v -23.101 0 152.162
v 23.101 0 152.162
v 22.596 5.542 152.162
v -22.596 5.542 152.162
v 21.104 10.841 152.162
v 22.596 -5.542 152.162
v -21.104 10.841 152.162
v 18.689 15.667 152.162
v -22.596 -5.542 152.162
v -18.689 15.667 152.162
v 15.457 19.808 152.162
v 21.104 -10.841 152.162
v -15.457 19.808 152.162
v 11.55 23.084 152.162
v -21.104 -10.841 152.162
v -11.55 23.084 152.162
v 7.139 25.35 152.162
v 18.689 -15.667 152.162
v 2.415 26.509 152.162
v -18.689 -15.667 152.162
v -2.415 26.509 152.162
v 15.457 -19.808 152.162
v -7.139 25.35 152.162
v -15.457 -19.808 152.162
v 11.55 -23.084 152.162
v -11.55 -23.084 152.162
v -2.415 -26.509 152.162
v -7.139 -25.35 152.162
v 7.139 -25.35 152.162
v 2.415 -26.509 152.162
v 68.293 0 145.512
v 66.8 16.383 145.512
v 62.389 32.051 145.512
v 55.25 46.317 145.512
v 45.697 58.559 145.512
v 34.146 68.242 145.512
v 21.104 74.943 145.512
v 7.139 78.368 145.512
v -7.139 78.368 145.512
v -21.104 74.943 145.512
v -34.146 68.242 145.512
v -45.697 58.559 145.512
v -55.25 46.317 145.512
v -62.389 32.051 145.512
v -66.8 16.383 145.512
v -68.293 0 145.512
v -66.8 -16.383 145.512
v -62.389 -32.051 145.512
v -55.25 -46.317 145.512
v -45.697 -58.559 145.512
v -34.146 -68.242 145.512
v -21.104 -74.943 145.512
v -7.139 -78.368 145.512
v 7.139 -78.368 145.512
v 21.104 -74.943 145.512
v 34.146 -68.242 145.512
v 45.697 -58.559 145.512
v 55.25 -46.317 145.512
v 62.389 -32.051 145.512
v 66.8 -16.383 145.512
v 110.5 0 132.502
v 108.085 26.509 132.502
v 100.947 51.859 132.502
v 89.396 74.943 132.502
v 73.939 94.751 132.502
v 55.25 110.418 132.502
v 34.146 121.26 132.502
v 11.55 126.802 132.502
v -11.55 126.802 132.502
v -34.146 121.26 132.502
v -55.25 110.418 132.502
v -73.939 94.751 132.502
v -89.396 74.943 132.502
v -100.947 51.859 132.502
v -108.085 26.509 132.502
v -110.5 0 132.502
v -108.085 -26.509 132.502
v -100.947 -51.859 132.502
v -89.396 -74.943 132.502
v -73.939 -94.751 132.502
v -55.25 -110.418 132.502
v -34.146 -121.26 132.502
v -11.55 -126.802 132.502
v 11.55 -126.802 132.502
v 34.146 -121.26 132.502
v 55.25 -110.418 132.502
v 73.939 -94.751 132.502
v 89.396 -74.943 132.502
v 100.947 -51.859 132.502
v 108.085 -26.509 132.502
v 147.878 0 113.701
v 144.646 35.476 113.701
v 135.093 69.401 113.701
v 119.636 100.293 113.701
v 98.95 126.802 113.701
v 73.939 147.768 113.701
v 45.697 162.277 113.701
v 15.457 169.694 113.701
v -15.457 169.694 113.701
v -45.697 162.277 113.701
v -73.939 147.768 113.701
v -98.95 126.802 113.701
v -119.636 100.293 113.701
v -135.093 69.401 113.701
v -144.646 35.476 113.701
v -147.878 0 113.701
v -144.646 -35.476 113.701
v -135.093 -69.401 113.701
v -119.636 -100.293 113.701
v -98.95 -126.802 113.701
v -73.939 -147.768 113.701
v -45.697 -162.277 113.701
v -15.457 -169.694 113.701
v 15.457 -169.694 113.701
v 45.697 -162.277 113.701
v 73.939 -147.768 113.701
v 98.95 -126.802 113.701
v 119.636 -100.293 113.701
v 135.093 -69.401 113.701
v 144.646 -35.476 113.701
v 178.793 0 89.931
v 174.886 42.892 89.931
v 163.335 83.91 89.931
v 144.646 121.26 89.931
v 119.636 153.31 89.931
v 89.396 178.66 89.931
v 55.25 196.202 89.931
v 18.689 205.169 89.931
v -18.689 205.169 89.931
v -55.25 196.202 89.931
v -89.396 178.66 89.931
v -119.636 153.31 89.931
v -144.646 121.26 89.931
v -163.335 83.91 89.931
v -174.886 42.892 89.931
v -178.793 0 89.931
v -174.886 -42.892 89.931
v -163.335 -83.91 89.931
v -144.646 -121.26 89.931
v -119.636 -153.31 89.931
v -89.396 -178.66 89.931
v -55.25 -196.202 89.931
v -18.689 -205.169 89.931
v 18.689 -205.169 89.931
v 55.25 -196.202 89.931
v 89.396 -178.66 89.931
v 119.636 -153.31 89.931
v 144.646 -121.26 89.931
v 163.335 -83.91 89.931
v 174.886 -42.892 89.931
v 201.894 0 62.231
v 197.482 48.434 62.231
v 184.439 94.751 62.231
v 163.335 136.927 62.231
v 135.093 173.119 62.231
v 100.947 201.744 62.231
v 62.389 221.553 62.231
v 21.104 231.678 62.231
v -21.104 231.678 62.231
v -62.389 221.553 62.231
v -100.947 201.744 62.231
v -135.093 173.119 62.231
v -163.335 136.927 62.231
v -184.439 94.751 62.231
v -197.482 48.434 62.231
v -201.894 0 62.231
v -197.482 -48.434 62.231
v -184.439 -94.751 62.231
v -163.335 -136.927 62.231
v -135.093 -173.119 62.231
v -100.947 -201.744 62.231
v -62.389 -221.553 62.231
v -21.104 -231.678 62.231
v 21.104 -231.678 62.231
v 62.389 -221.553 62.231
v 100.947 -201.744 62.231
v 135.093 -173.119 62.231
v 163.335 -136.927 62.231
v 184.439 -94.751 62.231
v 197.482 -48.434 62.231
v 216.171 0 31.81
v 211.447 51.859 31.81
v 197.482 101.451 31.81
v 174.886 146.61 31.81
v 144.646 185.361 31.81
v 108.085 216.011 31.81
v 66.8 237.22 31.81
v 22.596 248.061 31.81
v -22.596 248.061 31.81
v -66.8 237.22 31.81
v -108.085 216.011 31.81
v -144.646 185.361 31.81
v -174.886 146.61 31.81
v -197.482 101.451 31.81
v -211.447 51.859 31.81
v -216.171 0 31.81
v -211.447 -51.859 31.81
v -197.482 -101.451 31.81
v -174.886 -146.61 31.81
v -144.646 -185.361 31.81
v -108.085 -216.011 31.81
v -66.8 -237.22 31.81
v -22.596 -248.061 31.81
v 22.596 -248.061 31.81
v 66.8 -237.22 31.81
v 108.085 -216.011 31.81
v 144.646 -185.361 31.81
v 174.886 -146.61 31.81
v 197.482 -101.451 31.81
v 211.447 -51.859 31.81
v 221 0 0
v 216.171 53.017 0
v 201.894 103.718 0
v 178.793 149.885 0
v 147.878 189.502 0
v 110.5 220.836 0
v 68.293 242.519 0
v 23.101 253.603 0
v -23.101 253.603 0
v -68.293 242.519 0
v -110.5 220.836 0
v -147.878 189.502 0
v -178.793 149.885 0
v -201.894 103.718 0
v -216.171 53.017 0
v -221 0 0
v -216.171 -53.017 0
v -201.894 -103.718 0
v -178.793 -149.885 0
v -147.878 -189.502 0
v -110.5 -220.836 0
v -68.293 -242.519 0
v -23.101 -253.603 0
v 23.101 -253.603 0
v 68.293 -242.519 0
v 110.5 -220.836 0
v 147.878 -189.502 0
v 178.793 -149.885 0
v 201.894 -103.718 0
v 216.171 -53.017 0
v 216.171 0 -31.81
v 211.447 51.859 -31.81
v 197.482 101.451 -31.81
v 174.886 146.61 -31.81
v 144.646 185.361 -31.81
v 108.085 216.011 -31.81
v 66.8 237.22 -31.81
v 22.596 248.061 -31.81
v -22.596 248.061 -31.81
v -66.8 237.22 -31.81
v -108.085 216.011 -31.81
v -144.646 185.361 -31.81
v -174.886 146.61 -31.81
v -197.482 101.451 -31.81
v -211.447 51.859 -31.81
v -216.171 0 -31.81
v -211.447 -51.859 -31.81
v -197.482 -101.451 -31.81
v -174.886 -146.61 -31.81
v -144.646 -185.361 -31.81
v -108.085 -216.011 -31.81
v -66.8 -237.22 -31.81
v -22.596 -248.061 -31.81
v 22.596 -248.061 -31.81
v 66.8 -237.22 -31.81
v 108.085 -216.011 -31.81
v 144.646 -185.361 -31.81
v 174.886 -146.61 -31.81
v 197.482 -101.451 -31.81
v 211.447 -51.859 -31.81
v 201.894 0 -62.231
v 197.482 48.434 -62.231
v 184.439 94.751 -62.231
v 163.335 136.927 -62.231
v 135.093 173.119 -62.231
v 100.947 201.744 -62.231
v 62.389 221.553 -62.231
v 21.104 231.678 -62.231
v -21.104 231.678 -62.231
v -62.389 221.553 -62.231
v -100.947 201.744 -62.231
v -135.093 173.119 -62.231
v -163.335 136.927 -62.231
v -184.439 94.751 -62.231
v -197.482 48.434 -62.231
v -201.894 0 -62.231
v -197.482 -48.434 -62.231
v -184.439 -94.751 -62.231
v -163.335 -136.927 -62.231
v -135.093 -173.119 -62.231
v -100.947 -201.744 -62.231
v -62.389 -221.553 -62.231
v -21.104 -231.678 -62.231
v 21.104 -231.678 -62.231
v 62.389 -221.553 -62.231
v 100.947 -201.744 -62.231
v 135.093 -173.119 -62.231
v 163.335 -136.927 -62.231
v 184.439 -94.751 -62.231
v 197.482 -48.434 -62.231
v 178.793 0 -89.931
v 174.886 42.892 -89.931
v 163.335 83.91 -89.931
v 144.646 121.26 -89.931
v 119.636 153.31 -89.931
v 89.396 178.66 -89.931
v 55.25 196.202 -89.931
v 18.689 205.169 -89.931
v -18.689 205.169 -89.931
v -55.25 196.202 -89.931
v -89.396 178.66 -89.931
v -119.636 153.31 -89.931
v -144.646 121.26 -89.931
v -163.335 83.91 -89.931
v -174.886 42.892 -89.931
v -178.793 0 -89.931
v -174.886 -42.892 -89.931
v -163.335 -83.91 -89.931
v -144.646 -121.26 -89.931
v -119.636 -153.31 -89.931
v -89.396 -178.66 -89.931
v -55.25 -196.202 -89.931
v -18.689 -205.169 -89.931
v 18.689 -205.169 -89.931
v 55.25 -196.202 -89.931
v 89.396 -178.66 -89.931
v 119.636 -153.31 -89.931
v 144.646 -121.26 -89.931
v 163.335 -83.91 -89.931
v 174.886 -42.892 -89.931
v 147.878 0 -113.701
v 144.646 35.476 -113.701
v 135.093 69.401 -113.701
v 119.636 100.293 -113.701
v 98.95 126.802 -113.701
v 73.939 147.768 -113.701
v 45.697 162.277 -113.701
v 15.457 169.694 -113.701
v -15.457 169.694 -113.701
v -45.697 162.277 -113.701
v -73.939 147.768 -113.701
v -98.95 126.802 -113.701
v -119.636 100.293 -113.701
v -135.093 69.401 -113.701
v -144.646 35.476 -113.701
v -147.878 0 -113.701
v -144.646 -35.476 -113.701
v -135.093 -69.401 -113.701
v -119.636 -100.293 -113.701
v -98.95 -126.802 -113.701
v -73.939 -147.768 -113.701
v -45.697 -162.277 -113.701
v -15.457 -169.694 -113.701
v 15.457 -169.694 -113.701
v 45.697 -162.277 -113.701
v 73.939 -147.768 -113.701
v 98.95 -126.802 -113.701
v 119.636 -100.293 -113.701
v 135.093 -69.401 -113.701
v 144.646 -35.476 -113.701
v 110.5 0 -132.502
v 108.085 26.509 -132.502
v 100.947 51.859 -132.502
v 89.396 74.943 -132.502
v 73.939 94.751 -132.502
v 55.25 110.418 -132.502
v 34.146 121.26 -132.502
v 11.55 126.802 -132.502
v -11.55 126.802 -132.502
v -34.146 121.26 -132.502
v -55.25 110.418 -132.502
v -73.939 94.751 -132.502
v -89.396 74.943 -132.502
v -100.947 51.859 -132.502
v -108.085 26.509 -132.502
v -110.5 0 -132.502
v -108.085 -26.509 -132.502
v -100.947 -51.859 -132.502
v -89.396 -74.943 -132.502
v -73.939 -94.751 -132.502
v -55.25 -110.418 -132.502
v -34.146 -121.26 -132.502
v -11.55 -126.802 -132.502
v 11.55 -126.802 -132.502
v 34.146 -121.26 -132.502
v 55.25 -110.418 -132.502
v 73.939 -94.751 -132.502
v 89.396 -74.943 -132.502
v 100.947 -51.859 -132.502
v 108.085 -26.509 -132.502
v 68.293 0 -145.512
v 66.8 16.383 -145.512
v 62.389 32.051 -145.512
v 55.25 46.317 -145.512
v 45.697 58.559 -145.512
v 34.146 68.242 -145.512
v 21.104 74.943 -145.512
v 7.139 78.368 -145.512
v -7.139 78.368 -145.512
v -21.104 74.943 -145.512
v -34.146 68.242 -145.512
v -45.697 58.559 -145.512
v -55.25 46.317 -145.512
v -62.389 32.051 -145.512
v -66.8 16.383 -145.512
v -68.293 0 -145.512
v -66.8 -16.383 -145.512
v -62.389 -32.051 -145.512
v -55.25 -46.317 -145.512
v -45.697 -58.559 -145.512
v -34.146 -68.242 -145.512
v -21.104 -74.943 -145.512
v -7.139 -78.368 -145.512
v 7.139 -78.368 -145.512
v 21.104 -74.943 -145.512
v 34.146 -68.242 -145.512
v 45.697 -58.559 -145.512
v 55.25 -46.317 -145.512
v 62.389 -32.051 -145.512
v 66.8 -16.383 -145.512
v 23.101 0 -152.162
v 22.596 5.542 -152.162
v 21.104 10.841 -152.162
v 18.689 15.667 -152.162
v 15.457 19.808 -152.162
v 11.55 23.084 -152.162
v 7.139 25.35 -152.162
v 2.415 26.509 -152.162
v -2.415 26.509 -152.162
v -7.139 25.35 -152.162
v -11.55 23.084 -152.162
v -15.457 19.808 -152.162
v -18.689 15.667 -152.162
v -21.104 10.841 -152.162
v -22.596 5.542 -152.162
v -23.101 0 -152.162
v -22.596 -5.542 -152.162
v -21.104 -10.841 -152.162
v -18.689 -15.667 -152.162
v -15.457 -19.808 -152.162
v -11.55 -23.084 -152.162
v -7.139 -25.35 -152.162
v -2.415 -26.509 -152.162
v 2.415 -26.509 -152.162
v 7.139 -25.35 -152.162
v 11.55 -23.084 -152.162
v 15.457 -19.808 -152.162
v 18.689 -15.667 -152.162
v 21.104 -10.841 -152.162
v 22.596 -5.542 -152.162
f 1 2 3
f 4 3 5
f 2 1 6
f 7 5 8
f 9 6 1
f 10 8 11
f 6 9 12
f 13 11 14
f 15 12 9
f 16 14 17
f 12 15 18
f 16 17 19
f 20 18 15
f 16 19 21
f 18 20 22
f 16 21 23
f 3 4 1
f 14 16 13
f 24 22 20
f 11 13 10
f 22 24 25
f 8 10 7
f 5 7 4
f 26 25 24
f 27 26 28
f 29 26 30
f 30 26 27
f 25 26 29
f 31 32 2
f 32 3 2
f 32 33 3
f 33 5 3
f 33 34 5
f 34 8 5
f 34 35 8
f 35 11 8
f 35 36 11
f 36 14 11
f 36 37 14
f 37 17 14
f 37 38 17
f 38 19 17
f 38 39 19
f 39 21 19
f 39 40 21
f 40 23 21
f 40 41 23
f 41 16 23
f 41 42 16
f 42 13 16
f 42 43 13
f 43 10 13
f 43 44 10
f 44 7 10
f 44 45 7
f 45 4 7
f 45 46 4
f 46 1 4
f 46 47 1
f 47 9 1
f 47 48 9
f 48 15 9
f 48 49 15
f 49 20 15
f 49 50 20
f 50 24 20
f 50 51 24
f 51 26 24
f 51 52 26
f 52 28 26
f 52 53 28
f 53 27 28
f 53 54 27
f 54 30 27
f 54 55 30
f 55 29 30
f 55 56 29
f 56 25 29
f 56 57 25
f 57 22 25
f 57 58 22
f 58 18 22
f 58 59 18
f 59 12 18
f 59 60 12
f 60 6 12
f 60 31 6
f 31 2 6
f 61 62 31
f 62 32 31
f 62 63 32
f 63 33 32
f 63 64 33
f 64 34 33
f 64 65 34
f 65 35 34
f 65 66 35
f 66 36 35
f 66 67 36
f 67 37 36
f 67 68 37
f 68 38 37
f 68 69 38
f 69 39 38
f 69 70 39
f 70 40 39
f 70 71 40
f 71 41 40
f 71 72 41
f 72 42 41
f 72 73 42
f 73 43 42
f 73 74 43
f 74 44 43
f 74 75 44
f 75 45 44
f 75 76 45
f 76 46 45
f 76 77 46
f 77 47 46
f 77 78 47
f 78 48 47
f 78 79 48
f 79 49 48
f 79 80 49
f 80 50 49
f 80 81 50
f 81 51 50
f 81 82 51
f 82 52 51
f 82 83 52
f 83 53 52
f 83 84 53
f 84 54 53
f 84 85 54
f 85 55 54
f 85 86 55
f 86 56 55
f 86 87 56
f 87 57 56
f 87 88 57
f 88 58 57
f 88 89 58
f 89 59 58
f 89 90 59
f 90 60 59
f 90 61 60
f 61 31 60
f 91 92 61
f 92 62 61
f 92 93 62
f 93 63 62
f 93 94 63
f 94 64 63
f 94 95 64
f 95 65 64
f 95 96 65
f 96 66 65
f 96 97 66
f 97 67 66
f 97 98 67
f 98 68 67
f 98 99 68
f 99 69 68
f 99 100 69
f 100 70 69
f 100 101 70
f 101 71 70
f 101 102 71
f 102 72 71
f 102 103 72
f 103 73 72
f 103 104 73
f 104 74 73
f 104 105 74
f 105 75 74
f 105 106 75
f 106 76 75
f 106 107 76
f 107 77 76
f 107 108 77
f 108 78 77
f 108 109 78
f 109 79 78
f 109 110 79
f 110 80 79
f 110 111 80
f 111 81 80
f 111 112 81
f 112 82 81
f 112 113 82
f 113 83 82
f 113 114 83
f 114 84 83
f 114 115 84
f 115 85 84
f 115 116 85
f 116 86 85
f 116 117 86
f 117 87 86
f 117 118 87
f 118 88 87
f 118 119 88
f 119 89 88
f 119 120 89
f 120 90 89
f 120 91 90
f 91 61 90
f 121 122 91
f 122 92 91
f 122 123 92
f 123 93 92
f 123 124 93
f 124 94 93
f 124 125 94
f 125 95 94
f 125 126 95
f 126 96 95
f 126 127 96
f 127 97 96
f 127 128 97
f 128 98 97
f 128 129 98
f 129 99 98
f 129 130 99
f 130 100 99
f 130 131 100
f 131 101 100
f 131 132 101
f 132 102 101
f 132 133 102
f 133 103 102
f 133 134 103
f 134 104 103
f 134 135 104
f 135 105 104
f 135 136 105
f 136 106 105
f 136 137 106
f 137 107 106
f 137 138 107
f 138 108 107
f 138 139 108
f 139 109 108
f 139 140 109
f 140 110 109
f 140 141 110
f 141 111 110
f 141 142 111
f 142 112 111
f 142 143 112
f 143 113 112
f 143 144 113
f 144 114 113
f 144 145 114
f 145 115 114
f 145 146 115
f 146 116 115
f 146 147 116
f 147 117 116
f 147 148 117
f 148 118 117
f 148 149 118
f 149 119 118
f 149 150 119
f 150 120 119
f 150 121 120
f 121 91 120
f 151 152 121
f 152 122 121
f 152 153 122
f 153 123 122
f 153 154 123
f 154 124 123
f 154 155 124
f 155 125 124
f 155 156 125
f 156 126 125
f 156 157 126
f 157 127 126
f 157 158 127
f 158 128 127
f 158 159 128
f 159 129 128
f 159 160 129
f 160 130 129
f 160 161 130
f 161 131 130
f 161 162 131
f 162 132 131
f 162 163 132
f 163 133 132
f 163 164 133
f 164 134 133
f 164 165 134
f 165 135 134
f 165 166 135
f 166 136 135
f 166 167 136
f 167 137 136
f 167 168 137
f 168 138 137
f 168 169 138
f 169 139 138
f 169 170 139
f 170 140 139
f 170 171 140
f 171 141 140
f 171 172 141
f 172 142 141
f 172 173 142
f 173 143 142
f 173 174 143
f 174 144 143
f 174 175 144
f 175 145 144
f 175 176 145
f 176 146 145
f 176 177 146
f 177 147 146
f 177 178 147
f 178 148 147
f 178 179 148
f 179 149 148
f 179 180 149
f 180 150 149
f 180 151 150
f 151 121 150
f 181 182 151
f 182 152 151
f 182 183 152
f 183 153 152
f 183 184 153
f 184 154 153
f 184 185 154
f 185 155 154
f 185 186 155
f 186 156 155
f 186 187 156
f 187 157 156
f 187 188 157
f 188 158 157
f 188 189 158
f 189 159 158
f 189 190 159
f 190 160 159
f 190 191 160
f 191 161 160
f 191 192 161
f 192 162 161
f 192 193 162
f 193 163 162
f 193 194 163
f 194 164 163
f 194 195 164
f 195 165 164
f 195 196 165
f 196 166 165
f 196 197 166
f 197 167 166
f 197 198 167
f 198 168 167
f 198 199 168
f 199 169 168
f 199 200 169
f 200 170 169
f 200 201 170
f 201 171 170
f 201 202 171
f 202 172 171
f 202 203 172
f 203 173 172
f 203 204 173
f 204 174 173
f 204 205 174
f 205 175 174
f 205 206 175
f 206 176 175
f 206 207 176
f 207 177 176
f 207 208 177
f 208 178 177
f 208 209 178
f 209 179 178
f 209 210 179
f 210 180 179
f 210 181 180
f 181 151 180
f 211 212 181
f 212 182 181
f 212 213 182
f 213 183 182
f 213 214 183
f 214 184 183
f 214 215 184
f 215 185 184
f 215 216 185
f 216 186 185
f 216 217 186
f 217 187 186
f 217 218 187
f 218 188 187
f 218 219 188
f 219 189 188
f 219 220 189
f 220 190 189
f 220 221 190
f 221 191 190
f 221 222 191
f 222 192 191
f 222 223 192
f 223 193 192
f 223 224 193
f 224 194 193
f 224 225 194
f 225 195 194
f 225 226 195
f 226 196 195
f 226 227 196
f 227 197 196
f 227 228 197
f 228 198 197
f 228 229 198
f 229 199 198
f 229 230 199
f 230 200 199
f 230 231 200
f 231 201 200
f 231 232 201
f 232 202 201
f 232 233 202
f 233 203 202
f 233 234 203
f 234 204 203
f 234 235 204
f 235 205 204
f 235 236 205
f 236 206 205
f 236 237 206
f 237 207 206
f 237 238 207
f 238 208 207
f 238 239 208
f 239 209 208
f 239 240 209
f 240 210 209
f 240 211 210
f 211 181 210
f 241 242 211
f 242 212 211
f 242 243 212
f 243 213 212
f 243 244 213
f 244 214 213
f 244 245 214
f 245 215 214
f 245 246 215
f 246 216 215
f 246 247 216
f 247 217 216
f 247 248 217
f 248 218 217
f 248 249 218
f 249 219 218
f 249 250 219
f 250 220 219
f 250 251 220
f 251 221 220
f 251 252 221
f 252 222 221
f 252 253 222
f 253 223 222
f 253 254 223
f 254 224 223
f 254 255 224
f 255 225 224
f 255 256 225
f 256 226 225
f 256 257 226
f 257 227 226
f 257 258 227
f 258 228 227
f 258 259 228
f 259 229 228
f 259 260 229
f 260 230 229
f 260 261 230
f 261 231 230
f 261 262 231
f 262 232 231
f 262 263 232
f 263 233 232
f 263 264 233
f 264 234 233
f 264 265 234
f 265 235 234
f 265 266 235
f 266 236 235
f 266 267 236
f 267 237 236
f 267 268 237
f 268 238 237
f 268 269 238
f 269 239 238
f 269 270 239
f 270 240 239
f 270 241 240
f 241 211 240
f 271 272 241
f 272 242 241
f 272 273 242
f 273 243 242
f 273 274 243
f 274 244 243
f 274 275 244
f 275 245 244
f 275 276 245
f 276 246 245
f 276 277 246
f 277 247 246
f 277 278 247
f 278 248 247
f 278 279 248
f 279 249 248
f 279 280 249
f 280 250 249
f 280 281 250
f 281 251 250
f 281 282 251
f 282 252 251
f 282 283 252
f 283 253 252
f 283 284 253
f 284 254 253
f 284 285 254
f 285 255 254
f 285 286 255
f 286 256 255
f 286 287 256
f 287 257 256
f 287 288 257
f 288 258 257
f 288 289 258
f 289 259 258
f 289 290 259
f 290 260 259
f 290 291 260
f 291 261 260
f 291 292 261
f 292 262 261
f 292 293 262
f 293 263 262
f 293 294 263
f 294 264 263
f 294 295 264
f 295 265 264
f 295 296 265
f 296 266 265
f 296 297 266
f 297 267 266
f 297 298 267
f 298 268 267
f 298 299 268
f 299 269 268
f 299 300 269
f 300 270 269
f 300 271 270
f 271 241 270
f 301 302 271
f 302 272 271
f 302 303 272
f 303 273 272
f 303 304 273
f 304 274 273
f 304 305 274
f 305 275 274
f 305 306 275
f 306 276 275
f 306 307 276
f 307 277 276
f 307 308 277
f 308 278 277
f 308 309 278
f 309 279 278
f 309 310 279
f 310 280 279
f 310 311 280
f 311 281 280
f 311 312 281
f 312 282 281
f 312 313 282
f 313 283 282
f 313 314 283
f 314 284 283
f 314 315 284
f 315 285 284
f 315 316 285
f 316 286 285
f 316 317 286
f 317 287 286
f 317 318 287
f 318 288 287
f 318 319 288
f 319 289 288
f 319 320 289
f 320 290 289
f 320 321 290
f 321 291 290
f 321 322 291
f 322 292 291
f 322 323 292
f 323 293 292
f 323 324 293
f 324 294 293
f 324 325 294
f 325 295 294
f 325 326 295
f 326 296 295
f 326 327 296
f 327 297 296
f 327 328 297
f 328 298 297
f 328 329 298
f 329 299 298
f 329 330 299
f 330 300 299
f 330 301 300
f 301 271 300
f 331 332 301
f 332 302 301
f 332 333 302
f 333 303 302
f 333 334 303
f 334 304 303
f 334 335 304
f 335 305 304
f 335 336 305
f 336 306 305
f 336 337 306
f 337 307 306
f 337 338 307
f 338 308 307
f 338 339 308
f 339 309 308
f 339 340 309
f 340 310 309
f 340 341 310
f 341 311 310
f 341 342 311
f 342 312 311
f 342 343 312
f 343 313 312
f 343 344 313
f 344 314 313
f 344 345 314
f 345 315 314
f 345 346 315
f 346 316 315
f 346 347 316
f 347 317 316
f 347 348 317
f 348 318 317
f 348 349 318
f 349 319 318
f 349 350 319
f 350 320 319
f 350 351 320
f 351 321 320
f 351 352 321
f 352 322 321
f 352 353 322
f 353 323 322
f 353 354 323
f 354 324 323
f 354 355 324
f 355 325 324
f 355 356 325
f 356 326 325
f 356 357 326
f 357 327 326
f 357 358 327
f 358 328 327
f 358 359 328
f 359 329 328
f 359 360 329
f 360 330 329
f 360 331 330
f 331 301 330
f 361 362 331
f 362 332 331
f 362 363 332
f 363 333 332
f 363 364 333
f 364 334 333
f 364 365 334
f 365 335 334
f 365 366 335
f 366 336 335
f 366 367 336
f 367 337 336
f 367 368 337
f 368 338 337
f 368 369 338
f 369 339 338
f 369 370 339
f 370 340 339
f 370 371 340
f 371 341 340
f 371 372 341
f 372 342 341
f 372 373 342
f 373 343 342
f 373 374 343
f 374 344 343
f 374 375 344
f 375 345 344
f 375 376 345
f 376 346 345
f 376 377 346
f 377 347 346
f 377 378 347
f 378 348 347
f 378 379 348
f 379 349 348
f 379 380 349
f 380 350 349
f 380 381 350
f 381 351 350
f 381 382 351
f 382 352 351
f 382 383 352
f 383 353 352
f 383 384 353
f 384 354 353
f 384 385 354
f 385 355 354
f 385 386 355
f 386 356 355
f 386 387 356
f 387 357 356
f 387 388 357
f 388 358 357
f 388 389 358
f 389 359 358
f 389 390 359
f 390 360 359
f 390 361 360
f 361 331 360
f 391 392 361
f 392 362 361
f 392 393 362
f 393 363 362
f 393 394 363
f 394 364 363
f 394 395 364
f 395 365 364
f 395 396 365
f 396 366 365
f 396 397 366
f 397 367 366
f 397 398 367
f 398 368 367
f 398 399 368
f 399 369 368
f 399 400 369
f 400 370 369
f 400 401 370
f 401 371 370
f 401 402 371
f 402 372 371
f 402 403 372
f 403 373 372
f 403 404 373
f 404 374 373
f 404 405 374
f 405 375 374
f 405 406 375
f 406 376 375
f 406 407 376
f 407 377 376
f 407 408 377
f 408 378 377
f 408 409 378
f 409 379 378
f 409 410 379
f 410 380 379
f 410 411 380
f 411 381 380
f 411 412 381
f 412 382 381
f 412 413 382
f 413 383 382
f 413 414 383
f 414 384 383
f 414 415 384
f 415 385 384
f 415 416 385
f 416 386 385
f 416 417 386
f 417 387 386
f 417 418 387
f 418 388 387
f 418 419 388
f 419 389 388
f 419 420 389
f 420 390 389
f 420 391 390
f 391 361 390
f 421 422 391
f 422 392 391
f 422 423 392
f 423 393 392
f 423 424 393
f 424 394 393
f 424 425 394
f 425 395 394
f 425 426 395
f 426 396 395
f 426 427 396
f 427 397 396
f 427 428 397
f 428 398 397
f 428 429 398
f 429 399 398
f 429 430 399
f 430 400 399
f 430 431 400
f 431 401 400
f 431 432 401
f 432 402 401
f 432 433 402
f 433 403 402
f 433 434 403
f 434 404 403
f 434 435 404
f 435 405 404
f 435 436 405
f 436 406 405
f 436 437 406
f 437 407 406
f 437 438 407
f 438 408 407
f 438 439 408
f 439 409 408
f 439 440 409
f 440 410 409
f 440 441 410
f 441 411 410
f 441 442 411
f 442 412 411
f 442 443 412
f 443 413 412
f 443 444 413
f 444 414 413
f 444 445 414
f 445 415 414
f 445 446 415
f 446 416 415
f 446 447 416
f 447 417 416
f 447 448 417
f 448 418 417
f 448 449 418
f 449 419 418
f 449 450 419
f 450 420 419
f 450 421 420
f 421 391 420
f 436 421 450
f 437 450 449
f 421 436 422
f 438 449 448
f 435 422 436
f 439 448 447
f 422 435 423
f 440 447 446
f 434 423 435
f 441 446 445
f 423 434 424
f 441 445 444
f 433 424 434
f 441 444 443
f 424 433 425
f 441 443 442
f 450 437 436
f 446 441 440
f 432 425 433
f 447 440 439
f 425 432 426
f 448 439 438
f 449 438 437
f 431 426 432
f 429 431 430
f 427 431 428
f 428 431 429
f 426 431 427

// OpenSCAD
// Generated by SolidPython 1.0.1 on 2020-07-29 00:46:51


scale(v = [13, 15, 9]) {
	sphere(r = 17);
}
/***********************************************
*********      SolidPython code:      **********
************************************************
 
# import packages: SolidPython
from solid import *
from solid.utils import *
from itertools import chain, combinations, permutations


class Resize:

    def __init__(self, scad_file):
        self.scad_file = scad_file
        #self.scad_file = import_scad(scad_file)
        # cone/cylinder param:
        self.r1 = 0
        self.r2 = 0
        self.h = 0
        # rectangular prism param:
        self.w = 0
        self.l = 0
        # ellipse param:
        self.r = 0

    # import OpenScad code (file name corresponds to shape)


    # classify shape + parameters
    def assign(self, param1, param2, param3):
        if self.scad_file == 'cone.scad':
            self.r1 = param1
            self.r2 = param2
            self.h = param3
        elif self.scad_file == 'cylinder.scad':
            self.r1 = param1
            self.r2 = param2
            self.h = param3
        elif self.scad_file == 'rectangularPrism.scad':
            self.h = param1
            self.l = param2
            self.w = param3
        else:
            self.r = param1
            self.h = param2

    # resize parameters
    def iterate(self):
        x = range(3, 20, 2)
        i = 1
        if self.scad_file == 'cone.scad':
            tempList = list(permutations(x, 2))
            for temp in tempList:
                param1 = temp[0]
                param2 = temp[1]
                filepath = 'produced_scad_files/' + 'cone' + str(param1) + '_' + str(param2) + '_' + '.scad'
                scad_render_to_file(cylinder(h=param1, r1=param2, r2=0), filepath)

        elif self.scad_file == 'cylinder.scad':
            tempList = list(permutations(x, 3))
            for temp in tempList:
                param1 = temp[0]
                param2 = temp[1]
                filepath = 'produced_scad_files/' + 'cylinder' + str(param1) + '_' + str(param2) + '_' + '.scad'
                scad_render_to_file(cylinder(h=param1, r1=param2, r2=param2), filepath)

        elif self.scad_file == 'rectangularPrism.scad':
            tempList = list(permutations(x, 3))
            for temp in tempList:
                param1 = temp[0]
                param2 = temp[1]
                param3 = temp[2]
                filepath = 'produced_scad_files/' + 'rectangularPrism' + str(param1) + '_' + str(param2) + '_' + str(
                    param3) + '.scad'
                scad_render_to_file(cube(size=(param1, param2, param3)), filepath)

        elif self.scad_file == 'ellipse.scad':
            tempList = list(permutations(x, 4))
            for temp in tempList:
                param1 = temp[0]
                param2 = temp[1]
                param3 = temp[2]
                param4 = temp[3]
                filepath = 'produced_scad_files/' + 'ellipse' + str(param1) + '_' + str(param2) + '_' + str(param3) + '_' + str(param4) + '.scad'
                scad_render_to_file(scale([param1, param2, param3])(sphere(r=param4)), filepath)

    def render_to_scadfile(self):
        scad_render_to_file(scad, 'example.scad') 
 
************************************************/
